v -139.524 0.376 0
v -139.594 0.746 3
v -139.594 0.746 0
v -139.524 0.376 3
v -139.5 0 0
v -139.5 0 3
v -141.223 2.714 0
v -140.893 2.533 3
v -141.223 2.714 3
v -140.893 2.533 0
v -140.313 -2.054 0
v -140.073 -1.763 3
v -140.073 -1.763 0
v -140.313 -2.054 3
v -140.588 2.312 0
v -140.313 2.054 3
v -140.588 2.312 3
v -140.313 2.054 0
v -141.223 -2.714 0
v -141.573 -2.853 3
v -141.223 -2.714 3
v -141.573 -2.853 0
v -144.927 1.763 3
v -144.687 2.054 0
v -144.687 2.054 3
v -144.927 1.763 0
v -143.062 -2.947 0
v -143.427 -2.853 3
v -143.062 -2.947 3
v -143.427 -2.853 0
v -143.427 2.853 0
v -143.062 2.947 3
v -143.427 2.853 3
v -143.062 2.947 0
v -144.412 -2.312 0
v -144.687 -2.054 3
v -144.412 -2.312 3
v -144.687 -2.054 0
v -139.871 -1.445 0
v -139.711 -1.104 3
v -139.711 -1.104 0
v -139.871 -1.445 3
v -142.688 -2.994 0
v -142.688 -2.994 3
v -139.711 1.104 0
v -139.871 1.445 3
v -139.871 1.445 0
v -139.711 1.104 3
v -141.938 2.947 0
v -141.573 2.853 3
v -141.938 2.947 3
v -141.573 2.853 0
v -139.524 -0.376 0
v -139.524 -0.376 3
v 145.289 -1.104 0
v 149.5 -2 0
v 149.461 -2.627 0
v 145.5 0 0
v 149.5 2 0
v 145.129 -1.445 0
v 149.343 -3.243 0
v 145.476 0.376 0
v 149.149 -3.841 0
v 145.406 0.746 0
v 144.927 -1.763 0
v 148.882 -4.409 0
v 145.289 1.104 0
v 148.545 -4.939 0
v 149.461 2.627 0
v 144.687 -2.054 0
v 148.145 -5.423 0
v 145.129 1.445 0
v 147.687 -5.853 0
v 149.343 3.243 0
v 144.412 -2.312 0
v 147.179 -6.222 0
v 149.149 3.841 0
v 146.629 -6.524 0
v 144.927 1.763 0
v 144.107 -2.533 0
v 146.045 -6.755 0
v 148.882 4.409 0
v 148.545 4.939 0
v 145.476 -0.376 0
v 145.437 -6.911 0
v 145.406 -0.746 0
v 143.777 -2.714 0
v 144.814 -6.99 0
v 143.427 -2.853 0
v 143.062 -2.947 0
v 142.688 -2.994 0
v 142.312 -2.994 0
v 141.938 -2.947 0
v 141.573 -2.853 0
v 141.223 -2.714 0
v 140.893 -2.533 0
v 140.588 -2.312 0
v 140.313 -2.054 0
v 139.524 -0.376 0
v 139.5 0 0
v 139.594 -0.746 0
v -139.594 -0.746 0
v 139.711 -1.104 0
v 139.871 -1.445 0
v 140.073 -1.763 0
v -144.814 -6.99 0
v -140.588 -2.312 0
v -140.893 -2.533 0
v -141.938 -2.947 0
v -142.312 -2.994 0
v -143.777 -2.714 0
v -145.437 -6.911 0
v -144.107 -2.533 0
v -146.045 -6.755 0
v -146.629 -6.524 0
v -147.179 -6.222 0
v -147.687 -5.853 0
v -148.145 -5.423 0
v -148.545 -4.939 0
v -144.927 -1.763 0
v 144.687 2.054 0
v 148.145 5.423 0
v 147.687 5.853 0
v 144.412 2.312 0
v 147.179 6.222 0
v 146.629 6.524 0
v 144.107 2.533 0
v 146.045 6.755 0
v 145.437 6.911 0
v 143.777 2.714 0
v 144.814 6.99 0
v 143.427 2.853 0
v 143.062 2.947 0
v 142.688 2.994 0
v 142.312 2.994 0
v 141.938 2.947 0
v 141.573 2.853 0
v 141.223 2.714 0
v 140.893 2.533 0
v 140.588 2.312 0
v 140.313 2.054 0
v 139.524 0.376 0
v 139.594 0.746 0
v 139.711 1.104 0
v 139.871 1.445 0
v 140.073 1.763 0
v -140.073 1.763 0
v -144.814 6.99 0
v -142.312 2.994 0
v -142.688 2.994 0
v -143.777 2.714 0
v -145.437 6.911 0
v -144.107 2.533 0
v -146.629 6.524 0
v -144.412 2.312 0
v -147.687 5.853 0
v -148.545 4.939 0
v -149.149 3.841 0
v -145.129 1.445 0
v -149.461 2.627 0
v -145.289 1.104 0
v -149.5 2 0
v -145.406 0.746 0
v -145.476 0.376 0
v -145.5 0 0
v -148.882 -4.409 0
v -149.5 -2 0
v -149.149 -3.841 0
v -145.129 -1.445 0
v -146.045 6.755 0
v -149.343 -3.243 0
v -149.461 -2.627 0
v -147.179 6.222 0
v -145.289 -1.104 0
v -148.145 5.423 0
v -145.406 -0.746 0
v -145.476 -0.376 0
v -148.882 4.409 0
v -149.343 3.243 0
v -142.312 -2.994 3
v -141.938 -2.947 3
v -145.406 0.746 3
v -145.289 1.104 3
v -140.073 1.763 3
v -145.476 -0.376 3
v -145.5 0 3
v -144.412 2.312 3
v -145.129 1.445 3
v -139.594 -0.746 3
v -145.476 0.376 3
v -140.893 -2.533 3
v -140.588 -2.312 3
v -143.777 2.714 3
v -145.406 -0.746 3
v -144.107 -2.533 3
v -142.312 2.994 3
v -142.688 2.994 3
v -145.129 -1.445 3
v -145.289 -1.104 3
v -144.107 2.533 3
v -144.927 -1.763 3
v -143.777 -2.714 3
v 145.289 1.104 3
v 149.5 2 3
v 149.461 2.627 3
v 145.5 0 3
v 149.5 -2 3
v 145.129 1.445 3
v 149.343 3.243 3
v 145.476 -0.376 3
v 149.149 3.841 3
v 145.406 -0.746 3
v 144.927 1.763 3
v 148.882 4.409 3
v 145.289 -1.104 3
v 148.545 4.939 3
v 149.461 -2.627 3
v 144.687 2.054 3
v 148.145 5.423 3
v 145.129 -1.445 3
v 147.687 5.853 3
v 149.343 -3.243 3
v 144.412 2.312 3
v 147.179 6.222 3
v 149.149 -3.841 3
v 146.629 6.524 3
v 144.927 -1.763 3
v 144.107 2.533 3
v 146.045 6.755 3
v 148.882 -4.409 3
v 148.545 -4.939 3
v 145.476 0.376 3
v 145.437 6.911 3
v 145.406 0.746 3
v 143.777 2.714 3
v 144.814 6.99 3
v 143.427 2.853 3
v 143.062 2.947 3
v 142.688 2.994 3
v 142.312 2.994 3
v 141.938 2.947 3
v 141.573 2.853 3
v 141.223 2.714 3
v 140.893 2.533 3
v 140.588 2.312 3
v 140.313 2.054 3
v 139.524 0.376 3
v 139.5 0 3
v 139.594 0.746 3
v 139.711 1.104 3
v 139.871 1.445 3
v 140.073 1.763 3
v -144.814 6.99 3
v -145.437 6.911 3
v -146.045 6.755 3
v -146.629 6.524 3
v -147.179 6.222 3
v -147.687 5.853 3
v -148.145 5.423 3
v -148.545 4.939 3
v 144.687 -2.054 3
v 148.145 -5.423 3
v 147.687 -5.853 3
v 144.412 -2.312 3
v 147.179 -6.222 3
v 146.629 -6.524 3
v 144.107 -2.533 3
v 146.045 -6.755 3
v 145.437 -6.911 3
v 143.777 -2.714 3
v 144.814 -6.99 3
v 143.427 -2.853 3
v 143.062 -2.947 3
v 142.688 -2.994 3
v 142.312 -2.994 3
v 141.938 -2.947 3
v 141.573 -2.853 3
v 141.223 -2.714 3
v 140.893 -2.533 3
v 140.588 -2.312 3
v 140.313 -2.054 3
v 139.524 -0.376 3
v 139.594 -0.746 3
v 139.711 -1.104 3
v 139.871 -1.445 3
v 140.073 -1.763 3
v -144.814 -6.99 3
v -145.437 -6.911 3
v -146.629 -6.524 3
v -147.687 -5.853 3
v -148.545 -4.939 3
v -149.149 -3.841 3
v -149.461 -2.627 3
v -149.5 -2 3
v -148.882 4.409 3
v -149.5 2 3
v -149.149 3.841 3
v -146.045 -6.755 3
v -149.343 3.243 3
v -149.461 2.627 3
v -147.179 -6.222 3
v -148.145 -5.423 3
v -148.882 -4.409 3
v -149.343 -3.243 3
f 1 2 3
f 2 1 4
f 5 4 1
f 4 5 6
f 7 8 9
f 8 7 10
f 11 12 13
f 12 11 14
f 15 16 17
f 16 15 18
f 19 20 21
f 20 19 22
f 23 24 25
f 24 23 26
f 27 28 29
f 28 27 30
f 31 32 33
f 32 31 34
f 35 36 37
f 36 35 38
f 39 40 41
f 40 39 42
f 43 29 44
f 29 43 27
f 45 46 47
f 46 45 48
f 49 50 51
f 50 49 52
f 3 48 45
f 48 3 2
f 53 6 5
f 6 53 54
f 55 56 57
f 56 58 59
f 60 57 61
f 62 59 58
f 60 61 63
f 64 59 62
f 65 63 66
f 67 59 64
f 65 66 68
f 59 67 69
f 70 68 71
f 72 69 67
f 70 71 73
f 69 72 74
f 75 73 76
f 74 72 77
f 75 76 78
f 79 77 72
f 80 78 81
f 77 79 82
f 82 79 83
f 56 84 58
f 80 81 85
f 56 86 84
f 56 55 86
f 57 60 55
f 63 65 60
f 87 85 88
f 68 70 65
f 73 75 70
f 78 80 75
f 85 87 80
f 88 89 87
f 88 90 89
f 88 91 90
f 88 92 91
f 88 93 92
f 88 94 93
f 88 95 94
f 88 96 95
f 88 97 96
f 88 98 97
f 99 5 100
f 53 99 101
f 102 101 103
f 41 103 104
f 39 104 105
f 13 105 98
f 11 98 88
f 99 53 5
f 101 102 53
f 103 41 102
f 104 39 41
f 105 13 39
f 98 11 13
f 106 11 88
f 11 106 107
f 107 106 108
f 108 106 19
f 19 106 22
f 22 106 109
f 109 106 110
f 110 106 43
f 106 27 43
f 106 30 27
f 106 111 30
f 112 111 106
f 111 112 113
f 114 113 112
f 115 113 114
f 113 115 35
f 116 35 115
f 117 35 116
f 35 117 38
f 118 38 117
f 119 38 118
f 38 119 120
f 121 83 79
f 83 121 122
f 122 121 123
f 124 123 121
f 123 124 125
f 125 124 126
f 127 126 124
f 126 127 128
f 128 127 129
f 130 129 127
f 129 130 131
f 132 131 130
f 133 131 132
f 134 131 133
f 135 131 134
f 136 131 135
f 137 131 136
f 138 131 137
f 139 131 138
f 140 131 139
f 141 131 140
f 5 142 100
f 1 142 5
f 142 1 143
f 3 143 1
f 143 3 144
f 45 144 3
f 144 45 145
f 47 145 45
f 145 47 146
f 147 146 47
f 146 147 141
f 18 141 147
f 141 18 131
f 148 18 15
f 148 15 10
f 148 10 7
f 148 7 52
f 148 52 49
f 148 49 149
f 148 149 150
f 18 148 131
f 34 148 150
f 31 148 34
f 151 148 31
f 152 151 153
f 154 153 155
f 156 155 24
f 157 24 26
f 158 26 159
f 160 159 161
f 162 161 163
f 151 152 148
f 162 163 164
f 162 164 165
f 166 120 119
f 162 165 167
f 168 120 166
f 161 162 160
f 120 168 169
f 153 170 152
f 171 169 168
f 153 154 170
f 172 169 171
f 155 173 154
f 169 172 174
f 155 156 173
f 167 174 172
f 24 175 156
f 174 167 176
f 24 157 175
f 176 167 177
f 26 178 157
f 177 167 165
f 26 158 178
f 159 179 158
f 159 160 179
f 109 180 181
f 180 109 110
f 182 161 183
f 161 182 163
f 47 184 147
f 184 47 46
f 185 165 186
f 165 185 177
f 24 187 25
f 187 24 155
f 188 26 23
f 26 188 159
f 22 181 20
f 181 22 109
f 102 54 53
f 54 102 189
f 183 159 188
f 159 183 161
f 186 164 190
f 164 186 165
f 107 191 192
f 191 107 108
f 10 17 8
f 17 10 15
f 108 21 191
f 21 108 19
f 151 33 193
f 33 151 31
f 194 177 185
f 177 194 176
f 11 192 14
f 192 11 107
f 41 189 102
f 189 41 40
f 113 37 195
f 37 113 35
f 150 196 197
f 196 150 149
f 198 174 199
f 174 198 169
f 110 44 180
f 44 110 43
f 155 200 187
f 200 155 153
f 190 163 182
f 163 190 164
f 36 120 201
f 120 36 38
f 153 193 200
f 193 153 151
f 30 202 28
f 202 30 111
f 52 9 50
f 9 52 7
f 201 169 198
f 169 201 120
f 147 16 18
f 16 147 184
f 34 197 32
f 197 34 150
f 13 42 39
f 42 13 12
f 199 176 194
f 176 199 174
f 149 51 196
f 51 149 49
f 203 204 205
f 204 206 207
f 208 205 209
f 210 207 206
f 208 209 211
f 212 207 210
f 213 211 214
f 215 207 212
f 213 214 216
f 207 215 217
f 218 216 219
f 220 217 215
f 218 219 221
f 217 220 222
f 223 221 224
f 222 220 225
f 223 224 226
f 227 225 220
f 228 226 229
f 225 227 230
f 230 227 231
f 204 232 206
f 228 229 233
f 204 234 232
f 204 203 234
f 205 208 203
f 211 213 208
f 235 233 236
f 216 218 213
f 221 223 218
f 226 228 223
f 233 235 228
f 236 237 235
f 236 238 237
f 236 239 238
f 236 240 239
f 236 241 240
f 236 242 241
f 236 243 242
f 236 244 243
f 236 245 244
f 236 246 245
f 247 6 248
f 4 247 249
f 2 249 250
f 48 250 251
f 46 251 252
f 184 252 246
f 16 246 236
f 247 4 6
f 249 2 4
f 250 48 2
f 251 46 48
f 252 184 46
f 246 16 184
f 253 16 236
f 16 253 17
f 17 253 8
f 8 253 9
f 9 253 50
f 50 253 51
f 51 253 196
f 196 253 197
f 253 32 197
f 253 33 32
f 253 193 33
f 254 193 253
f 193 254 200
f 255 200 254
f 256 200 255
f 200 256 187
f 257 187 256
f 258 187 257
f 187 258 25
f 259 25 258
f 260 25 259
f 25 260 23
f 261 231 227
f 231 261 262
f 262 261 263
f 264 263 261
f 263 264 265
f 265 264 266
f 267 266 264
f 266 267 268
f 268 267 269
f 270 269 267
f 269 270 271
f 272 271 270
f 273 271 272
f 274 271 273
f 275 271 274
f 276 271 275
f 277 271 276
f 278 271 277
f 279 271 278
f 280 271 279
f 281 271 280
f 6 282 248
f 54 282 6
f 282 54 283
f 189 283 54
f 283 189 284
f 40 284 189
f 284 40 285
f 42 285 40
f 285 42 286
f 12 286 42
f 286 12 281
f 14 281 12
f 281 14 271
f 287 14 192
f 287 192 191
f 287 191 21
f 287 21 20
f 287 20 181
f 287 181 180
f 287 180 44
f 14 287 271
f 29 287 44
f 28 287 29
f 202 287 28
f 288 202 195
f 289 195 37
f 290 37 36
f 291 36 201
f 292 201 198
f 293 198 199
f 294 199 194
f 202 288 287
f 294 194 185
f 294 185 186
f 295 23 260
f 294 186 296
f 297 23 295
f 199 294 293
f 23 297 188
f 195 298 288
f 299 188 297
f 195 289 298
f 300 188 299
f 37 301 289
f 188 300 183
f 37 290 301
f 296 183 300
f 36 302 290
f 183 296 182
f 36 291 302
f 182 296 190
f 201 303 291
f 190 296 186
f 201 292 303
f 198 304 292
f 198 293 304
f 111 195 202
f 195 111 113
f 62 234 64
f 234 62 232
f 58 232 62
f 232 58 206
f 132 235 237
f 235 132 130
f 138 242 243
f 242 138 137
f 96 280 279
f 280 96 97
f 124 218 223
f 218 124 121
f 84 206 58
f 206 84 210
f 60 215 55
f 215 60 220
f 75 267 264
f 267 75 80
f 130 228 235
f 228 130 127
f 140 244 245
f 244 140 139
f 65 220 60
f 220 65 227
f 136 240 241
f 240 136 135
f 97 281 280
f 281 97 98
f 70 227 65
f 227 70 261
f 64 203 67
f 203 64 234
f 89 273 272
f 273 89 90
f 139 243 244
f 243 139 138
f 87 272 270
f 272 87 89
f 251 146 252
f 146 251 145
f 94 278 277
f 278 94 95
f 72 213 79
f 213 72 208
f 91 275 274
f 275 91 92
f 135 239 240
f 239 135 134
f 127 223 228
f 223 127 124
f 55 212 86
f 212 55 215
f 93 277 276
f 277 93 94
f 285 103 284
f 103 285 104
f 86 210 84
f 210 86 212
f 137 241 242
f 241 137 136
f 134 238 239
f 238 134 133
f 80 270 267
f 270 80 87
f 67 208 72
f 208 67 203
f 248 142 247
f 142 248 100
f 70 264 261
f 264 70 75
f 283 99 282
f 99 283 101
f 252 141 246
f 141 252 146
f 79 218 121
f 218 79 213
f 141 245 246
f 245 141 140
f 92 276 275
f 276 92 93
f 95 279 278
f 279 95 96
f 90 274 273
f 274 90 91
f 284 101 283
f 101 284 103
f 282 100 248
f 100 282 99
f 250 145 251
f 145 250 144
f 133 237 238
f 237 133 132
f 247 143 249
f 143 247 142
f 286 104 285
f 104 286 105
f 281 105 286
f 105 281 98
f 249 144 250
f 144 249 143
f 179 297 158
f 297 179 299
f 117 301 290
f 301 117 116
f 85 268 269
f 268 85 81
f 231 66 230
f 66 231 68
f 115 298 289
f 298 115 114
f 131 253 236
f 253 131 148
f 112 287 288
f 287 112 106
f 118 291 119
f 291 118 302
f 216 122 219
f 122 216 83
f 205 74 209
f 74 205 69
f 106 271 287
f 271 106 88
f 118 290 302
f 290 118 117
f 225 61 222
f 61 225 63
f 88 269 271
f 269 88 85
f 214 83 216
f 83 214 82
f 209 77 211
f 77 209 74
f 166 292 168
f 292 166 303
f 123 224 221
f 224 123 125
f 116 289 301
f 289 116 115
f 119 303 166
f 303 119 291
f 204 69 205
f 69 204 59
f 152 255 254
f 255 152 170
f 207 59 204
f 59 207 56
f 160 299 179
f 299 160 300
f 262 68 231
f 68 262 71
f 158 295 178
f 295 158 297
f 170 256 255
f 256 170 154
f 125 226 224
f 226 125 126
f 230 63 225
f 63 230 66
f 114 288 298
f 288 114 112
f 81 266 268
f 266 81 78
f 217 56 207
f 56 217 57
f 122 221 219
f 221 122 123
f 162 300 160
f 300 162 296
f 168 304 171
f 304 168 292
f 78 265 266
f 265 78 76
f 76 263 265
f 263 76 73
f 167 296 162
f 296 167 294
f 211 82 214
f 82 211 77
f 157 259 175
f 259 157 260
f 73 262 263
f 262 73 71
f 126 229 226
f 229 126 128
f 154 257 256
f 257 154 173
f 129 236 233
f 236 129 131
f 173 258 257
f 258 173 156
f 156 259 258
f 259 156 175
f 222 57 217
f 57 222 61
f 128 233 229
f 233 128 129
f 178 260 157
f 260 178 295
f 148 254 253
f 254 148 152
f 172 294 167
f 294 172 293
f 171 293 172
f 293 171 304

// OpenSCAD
$fn = 50;


difference() {
	union() {
		hull() {
			translate(v = [-144.5000000000, 2.0000000000, 0]) {
				cylinder(h = 3, r = 5);
			}
			translate(v = [144.5000000000, 2.0000000000, 0]) {
				cylinder(h = 3, r = 5);
			}
			translate(v = [-144.5000000000, -2.0000000000, 0]) {
				cylinder(h = 3, r = 5);
			}
			translate(v = [144.5000000000, -2.0000000000, 0]) {
				cylinder(h = 3, r = 5);
			}
		}
	}
	union() {
		translate(v = [-142.5000000000, 0.0000000000, 0]) {
			cylinder(h = 3, r = 3.0000000000);
		}
		translate(v = [142.5000000000, 0.0000000000, 0]) {
			cylinder(h = 3, r = 3.0000000000);
		}
		translate(v = [-142.5000000000, 0.0000000000, 0]) {
			cylinder(h = 3, r = 1.5000000000);
		}
		translate(v = [142.5000000000, 0.0000000000, 0]) {
			cylinder(h = 3, r = 1.5000000000);
		}
		translate(v = [-142.5000000000, 0.0000000000, 0]) {
			cylinder(h = 3, r = 1.5000000000);
		}
		translate(v = [142.5000000000, 0.0000000000, 0]) {
			cylinder(h = 3, r = 1.5000000000);
		}
		translate(v = [-142.5000000000, 0.0000000000, 0]) {
			cylinder(h = 3, r = 1.5000000000);
		}
		translate(v = [142.5000000000, 0.0000000000, 0]) {
			cylinder(h = 3, r = 1.5000000000);
		}
	}
}
